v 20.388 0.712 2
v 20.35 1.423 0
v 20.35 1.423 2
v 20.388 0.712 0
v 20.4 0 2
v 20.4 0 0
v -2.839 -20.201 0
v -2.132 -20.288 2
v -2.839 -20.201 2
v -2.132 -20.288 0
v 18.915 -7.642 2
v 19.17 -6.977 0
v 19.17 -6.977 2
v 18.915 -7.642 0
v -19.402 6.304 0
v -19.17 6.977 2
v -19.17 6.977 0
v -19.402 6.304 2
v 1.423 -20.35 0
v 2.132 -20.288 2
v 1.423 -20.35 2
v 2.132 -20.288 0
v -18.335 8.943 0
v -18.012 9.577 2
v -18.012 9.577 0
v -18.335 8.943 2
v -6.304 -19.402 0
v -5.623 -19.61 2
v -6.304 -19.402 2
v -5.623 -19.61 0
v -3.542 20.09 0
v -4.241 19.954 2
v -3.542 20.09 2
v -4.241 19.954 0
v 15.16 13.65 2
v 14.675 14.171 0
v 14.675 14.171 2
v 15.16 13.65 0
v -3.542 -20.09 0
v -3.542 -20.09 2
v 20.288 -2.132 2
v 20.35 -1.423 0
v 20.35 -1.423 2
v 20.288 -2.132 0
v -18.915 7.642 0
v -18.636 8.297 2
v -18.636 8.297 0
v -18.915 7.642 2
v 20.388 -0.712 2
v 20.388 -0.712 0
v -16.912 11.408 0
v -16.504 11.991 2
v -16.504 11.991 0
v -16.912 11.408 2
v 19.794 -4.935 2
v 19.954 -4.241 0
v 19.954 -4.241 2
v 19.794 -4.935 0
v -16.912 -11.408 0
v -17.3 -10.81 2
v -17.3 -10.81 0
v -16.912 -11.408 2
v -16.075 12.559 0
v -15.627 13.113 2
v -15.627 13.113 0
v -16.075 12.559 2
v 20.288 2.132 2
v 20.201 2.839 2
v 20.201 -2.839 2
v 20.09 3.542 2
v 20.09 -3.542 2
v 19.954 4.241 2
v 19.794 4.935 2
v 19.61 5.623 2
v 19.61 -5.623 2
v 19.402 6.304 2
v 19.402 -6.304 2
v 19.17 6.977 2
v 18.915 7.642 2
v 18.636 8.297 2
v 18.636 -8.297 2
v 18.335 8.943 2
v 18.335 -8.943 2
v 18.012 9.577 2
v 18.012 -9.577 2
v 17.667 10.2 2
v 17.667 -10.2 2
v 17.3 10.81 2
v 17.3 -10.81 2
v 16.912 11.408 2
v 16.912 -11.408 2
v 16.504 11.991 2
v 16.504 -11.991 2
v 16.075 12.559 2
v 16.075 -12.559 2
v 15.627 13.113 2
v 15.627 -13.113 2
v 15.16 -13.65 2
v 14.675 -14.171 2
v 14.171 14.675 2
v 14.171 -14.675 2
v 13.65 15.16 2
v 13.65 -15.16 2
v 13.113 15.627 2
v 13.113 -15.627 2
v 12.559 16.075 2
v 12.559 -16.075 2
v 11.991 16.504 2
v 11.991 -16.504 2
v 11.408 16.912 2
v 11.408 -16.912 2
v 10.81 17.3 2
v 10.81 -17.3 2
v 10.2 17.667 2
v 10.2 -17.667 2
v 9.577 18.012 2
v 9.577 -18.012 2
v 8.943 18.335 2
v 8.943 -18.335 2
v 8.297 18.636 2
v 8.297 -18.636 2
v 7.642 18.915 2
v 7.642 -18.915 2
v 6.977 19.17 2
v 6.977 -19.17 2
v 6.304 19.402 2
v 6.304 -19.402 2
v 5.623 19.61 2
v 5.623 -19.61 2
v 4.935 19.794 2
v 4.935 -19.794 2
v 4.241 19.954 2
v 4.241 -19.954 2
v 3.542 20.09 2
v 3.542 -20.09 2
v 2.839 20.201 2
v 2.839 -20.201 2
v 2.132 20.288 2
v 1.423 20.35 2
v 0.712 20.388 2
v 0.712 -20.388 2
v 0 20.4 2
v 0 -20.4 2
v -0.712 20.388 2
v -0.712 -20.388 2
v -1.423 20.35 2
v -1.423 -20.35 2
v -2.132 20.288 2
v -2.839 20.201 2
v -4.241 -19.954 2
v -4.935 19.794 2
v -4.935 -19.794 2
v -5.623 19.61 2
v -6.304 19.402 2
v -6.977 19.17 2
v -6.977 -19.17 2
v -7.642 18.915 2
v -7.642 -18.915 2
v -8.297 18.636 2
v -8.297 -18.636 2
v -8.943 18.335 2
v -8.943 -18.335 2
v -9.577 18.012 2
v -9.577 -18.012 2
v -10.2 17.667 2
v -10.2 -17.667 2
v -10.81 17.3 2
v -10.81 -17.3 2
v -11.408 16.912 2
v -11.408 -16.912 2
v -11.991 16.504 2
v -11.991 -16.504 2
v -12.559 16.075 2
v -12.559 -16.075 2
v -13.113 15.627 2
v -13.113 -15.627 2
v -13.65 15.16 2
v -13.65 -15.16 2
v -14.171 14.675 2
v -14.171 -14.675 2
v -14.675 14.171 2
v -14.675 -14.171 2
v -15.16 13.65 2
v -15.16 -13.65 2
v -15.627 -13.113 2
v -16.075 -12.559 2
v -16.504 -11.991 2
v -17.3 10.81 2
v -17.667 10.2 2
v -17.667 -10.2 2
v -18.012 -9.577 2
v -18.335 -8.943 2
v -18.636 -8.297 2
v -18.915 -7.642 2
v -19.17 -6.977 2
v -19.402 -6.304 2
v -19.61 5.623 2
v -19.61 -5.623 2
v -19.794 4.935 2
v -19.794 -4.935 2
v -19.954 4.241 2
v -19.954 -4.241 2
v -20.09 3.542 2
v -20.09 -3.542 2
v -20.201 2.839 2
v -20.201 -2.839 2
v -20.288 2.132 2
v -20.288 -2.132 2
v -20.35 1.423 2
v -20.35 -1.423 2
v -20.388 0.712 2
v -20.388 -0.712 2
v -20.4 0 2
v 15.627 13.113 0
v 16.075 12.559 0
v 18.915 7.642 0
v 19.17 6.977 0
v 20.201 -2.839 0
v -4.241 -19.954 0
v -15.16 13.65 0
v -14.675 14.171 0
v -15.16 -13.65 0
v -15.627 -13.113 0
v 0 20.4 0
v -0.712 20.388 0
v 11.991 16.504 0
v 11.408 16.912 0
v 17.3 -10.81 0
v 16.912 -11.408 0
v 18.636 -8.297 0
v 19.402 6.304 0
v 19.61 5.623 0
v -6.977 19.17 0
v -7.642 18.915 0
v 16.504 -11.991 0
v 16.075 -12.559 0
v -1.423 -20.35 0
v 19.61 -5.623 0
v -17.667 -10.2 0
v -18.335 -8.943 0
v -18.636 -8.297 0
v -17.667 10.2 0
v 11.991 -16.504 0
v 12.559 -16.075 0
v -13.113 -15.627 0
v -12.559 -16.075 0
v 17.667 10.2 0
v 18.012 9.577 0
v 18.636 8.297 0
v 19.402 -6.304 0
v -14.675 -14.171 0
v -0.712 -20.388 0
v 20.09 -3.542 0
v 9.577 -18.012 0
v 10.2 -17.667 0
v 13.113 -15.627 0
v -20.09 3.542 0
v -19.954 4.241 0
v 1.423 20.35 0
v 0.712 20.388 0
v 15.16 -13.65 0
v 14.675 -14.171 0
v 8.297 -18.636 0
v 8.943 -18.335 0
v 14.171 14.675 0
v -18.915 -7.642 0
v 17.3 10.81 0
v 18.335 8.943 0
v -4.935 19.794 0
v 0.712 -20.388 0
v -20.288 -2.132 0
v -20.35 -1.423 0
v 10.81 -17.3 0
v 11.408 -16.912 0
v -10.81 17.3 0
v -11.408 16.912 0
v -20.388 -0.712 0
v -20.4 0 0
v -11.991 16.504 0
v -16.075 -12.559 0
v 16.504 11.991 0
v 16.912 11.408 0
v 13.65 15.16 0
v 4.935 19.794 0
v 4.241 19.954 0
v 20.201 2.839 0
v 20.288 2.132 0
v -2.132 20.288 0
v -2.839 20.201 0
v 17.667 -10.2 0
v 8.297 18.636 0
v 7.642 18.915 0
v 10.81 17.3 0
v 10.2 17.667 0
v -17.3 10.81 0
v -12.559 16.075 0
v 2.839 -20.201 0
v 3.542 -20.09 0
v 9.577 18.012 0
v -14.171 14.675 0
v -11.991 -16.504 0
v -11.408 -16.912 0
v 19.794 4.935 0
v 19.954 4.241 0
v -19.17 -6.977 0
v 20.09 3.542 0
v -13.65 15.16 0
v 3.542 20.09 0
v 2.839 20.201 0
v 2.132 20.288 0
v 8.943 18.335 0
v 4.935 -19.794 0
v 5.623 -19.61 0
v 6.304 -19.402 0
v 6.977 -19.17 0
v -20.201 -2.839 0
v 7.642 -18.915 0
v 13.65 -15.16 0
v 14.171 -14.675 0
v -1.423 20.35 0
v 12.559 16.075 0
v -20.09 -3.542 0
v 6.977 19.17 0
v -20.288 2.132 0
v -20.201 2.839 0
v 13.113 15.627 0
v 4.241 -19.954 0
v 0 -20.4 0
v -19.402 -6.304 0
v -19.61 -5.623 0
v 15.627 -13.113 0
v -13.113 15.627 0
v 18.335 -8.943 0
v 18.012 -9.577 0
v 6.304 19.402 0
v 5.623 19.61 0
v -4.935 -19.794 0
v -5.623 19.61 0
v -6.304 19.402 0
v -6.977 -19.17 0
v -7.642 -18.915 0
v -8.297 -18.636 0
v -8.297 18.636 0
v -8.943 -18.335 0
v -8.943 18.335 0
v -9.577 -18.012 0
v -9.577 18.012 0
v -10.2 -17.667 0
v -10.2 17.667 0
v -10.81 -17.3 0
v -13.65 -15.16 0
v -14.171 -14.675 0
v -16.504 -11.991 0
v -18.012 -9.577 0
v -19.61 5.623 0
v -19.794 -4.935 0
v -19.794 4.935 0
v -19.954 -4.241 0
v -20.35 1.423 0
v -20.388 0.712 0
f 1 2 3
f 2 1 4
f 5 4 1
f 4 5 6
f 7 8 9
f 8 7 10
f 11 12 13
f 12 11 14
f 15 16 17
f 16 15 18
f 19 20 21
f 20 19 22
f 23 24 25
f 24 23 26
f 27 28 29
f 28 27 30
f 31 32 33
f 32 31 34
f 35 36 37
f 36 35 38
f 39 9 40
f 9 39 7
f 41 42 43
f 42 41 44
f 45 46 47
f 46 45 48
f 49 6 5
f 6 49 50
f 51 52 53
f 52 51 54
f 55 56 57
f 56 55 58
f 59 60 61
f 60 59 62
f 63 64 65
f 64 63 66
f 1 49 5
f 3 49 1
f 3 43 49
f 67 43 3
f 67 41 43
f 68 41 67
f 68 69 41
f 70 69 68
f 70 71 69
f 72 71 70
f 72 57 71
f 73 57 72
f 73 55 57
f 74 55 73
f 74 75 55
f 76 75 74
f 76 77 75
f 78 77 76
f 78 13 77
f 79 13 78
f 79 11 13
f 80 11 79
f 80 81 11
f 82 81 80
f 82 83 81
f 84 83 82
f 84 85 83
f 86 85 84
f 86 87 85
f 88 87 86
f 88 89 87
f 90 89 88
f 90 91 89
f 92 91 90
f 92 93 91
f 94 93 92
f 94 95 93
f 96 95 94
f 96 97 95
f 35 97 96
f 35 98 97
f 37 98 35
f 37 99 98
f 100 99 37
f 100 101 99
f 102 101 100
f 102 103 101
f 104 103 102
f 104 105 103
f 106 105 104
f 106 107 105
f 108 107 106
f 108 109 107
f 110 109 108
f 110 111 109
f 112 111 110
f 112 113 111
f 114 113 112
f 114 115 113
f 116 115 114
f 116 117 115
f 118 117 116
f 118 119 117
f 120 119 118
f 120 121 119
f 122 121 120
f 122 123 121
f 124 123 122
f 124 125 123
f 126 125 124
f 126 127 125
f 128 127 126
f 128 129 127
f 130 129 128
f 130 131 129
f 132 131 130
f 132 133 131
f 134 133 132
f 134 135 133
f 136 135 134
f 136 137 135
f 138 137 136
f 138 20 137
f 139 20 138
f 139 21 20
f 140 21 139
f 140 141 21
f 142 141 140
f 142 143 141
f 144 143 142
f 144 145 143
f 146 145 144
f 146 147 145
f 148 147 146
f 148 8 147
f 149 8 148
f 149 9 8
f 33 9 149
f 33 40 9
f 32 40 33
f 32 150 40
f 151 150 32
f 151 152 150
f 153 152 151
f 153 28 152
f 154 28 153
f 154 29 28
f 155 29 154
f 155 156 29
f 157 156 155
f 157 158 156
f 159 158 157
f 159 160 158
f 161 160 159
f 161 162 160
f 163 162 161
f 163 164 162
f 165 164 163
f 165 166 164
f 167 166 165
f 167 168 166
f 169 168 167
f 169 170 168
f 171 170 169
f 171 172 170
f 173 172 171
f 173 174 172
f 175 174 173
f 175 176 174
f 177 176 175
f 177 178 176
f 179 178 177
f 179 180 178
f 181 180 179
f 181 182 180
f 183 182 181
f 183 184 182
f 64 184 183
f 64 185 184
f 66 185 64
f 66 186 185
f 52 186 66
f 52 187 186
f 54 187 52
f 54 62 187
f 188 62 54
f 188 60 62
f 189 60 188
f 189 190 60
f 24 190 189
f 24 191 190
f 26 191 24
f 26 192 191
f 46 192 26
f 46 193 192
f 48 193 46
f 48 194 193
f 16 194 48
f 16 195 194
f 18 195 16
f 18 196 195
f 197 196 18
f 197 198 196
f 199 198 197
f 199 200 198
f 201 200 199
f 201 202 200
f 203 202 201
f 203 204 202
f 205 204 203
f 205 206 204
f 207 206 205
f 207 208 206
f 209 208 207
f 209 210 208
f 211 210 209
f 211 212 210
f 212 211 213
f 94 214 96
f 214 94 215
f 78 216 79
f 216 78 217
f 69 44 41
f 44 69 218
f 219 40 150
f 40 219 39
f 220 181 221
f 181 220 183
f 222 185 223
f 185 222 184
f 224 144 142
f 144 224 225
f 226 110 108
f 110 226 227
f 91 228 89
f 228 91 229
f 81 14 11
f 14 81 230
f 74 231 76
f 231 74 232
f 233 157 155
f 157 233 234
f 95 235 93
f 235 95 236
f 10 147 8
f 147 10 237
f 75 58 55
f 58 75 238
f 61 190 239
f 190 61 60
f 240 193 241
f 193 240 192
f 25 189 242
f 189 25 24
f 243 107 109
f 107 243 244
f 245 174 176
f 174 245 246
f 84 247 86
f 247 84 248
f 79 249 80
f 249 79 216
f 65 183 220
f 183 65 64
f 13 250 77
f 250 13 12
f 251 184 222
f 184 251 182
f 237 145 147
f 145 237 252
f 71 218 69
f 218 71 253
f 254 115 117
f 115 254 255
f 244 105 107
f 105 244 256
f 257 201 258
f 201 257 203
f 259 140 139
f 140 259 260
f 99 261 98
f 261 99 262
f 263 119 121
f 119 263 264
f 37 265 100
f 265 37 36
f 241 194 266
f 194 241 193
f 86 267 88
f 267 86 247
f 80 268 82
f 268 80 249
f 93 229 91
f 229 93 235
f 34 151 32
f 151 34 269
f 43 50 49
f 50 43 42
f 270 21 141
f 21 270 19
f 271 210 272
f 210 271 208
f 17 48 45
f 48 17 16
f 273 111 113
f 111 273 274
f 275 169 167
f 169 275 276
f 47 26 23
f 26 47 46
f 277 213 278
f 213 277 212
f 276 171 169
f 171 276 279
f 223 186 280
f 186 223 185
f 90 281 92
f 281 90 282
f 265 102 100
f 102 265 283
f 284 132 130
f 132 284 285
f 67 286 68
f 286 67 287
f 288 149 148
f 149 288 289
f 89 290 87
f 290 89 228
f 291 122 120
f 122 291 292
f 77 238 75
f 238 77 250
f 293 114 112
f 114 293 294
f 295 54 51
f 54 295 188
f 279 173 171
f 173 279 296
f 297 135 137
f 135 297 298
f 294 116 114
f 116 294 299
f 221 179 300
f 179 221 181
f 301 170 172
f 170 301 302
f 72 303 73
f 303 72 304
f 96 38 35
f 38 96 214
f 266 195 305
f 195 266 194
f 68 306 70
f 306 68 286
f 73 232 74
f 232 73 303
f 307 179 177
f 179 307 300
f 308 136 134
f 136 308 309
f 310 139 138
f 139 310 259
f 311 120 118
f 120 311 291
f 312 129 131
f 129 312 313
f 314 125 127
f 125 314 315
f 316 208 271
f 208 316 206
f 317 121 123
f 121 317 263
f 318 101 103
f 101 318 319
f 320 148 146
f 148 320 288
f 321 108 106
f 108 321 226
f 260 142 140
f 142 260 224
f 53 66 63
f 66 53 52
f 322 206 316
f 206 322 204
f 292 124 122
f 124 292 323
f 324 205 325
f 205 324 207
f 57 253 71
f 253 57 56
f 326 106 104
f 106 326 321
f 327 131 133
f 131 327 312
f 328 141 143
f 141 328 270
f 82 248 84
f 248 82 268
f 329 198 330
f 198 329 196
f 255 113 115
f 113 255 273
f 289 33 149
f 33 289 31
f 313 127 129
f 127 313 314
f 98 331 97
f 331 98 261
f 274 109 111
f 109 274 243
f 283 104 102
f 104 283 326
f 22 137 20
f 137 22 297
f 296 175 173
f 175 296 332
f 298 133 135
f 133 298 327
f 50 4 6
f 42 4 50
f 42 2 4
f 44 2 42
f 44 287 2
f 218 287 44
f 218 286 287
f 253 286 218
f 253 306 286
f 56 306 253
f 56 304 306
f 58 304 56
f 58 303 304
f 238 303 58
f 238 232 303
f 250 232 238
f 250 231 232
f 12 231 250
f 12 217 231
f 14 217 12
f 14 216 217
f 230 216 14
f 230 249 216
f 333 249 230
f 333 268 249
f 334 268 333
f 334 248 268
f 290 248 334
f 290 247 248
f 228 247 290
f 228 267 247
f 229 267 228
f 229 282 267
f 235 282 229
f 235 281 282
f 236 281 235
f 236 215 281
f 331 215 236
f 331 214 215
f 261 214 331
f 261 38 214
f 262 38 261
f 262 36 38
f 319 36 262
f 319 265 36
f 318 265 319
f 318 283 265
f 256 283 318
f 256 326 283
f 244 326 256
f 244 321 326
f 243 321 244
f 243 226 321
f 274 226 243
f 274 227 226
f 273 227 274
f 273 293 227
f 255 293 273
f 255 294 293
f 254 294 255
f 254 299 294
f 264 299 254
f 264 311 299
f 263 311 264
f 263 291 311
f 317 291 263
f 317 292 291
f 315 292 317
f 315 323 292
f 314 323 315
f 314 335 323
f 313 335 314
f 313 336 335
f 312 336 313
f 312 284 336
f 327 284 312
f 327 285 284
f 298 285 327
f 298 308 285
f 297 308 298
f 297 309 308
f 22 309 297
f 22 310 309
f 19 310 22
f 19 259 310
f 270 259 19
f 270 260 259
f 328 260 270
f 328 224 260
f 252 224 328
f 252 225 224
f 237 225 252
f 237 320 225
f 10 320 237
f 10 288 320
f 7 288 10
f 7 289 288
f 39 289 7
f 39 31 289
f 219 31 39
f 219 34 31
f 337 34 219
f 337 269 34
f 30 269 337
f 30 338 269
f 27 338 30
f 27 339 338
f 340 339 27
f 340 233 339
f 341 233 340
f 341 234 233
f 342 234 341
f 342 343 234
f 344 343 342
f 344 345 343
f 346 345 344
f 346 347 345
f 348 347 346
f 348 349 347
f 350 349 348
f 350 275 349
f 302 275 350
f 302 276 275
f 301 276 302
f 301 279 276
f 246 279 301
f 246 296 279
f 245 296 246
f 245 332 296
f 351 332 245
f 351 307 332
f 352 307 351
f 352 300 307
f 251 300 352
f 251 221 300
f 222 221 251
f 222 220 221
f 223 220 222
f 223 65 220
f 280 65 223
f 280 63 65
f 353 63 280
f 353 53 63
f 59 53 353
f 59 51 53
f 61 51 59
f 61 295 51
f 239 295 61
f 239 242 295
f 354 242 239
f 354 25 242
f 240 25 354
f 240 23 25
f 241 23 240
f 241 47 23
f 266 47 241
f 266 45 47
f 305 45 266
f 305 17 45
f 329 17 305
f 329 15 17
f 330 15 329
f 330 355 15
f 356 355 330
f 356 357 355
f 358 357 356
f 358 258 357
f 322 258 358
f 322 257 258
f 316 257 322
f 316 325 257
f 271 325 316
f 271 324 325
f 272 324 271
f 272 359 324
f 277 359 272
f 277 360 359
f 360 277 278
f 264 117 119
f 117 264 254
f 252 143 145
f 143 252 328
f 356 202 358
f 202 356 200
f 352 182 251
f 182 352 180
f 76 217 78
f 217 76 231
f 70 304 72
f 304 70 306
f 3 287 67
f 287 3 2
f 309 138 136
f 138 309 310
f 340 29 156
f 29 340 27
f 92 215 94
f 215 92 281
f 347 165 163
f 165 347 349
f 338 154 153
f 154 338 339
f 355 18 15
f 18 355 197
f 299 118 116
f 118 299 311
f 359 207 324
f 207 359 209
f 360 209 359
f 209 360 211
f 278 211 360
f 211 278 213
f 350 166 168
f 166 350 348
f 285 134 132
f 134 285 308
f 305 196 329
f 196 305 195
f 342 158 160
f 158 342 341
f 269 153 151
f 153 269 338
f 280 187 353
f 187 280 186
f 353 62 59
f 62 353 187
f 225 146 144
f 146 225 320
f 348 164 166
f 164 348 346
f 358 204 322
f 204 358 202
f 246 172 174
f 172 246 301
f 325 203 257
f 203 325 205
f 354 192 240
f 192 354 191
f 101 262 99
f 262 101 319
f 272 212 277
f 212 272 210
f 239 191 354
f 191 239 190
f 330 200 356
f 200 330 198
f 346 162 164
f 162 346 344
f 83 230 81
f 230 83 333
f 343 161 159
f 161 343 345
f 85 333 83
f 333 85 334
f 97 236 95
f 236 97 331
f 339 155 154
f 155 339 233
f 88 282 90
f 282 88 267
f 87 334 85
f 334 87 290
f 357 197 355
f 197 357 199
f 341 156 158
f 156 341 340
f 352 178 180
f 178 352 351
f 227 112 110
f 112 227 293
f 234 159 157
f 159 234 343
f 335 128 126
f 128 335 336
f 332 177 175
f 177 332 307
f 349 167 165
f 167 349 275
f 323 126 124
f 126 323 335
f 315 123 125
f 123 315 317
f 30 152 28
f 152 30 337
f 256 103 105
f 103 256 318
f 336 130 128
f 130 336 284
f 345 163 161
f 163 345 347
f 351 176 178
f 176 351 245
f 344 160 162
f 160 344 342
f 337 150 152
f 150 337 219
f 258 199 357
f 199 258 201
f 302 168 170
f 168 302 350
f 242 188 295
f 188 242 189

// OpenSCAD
$fn=180;

radii = [20.4, 10.8, 5.3, 1];

module radial(rs, h=2) {
    union() {
        for (r = rs) {
            cylinder(h=h, r=r, center=false);
        }
    }
}

radial(radii, h=2);
